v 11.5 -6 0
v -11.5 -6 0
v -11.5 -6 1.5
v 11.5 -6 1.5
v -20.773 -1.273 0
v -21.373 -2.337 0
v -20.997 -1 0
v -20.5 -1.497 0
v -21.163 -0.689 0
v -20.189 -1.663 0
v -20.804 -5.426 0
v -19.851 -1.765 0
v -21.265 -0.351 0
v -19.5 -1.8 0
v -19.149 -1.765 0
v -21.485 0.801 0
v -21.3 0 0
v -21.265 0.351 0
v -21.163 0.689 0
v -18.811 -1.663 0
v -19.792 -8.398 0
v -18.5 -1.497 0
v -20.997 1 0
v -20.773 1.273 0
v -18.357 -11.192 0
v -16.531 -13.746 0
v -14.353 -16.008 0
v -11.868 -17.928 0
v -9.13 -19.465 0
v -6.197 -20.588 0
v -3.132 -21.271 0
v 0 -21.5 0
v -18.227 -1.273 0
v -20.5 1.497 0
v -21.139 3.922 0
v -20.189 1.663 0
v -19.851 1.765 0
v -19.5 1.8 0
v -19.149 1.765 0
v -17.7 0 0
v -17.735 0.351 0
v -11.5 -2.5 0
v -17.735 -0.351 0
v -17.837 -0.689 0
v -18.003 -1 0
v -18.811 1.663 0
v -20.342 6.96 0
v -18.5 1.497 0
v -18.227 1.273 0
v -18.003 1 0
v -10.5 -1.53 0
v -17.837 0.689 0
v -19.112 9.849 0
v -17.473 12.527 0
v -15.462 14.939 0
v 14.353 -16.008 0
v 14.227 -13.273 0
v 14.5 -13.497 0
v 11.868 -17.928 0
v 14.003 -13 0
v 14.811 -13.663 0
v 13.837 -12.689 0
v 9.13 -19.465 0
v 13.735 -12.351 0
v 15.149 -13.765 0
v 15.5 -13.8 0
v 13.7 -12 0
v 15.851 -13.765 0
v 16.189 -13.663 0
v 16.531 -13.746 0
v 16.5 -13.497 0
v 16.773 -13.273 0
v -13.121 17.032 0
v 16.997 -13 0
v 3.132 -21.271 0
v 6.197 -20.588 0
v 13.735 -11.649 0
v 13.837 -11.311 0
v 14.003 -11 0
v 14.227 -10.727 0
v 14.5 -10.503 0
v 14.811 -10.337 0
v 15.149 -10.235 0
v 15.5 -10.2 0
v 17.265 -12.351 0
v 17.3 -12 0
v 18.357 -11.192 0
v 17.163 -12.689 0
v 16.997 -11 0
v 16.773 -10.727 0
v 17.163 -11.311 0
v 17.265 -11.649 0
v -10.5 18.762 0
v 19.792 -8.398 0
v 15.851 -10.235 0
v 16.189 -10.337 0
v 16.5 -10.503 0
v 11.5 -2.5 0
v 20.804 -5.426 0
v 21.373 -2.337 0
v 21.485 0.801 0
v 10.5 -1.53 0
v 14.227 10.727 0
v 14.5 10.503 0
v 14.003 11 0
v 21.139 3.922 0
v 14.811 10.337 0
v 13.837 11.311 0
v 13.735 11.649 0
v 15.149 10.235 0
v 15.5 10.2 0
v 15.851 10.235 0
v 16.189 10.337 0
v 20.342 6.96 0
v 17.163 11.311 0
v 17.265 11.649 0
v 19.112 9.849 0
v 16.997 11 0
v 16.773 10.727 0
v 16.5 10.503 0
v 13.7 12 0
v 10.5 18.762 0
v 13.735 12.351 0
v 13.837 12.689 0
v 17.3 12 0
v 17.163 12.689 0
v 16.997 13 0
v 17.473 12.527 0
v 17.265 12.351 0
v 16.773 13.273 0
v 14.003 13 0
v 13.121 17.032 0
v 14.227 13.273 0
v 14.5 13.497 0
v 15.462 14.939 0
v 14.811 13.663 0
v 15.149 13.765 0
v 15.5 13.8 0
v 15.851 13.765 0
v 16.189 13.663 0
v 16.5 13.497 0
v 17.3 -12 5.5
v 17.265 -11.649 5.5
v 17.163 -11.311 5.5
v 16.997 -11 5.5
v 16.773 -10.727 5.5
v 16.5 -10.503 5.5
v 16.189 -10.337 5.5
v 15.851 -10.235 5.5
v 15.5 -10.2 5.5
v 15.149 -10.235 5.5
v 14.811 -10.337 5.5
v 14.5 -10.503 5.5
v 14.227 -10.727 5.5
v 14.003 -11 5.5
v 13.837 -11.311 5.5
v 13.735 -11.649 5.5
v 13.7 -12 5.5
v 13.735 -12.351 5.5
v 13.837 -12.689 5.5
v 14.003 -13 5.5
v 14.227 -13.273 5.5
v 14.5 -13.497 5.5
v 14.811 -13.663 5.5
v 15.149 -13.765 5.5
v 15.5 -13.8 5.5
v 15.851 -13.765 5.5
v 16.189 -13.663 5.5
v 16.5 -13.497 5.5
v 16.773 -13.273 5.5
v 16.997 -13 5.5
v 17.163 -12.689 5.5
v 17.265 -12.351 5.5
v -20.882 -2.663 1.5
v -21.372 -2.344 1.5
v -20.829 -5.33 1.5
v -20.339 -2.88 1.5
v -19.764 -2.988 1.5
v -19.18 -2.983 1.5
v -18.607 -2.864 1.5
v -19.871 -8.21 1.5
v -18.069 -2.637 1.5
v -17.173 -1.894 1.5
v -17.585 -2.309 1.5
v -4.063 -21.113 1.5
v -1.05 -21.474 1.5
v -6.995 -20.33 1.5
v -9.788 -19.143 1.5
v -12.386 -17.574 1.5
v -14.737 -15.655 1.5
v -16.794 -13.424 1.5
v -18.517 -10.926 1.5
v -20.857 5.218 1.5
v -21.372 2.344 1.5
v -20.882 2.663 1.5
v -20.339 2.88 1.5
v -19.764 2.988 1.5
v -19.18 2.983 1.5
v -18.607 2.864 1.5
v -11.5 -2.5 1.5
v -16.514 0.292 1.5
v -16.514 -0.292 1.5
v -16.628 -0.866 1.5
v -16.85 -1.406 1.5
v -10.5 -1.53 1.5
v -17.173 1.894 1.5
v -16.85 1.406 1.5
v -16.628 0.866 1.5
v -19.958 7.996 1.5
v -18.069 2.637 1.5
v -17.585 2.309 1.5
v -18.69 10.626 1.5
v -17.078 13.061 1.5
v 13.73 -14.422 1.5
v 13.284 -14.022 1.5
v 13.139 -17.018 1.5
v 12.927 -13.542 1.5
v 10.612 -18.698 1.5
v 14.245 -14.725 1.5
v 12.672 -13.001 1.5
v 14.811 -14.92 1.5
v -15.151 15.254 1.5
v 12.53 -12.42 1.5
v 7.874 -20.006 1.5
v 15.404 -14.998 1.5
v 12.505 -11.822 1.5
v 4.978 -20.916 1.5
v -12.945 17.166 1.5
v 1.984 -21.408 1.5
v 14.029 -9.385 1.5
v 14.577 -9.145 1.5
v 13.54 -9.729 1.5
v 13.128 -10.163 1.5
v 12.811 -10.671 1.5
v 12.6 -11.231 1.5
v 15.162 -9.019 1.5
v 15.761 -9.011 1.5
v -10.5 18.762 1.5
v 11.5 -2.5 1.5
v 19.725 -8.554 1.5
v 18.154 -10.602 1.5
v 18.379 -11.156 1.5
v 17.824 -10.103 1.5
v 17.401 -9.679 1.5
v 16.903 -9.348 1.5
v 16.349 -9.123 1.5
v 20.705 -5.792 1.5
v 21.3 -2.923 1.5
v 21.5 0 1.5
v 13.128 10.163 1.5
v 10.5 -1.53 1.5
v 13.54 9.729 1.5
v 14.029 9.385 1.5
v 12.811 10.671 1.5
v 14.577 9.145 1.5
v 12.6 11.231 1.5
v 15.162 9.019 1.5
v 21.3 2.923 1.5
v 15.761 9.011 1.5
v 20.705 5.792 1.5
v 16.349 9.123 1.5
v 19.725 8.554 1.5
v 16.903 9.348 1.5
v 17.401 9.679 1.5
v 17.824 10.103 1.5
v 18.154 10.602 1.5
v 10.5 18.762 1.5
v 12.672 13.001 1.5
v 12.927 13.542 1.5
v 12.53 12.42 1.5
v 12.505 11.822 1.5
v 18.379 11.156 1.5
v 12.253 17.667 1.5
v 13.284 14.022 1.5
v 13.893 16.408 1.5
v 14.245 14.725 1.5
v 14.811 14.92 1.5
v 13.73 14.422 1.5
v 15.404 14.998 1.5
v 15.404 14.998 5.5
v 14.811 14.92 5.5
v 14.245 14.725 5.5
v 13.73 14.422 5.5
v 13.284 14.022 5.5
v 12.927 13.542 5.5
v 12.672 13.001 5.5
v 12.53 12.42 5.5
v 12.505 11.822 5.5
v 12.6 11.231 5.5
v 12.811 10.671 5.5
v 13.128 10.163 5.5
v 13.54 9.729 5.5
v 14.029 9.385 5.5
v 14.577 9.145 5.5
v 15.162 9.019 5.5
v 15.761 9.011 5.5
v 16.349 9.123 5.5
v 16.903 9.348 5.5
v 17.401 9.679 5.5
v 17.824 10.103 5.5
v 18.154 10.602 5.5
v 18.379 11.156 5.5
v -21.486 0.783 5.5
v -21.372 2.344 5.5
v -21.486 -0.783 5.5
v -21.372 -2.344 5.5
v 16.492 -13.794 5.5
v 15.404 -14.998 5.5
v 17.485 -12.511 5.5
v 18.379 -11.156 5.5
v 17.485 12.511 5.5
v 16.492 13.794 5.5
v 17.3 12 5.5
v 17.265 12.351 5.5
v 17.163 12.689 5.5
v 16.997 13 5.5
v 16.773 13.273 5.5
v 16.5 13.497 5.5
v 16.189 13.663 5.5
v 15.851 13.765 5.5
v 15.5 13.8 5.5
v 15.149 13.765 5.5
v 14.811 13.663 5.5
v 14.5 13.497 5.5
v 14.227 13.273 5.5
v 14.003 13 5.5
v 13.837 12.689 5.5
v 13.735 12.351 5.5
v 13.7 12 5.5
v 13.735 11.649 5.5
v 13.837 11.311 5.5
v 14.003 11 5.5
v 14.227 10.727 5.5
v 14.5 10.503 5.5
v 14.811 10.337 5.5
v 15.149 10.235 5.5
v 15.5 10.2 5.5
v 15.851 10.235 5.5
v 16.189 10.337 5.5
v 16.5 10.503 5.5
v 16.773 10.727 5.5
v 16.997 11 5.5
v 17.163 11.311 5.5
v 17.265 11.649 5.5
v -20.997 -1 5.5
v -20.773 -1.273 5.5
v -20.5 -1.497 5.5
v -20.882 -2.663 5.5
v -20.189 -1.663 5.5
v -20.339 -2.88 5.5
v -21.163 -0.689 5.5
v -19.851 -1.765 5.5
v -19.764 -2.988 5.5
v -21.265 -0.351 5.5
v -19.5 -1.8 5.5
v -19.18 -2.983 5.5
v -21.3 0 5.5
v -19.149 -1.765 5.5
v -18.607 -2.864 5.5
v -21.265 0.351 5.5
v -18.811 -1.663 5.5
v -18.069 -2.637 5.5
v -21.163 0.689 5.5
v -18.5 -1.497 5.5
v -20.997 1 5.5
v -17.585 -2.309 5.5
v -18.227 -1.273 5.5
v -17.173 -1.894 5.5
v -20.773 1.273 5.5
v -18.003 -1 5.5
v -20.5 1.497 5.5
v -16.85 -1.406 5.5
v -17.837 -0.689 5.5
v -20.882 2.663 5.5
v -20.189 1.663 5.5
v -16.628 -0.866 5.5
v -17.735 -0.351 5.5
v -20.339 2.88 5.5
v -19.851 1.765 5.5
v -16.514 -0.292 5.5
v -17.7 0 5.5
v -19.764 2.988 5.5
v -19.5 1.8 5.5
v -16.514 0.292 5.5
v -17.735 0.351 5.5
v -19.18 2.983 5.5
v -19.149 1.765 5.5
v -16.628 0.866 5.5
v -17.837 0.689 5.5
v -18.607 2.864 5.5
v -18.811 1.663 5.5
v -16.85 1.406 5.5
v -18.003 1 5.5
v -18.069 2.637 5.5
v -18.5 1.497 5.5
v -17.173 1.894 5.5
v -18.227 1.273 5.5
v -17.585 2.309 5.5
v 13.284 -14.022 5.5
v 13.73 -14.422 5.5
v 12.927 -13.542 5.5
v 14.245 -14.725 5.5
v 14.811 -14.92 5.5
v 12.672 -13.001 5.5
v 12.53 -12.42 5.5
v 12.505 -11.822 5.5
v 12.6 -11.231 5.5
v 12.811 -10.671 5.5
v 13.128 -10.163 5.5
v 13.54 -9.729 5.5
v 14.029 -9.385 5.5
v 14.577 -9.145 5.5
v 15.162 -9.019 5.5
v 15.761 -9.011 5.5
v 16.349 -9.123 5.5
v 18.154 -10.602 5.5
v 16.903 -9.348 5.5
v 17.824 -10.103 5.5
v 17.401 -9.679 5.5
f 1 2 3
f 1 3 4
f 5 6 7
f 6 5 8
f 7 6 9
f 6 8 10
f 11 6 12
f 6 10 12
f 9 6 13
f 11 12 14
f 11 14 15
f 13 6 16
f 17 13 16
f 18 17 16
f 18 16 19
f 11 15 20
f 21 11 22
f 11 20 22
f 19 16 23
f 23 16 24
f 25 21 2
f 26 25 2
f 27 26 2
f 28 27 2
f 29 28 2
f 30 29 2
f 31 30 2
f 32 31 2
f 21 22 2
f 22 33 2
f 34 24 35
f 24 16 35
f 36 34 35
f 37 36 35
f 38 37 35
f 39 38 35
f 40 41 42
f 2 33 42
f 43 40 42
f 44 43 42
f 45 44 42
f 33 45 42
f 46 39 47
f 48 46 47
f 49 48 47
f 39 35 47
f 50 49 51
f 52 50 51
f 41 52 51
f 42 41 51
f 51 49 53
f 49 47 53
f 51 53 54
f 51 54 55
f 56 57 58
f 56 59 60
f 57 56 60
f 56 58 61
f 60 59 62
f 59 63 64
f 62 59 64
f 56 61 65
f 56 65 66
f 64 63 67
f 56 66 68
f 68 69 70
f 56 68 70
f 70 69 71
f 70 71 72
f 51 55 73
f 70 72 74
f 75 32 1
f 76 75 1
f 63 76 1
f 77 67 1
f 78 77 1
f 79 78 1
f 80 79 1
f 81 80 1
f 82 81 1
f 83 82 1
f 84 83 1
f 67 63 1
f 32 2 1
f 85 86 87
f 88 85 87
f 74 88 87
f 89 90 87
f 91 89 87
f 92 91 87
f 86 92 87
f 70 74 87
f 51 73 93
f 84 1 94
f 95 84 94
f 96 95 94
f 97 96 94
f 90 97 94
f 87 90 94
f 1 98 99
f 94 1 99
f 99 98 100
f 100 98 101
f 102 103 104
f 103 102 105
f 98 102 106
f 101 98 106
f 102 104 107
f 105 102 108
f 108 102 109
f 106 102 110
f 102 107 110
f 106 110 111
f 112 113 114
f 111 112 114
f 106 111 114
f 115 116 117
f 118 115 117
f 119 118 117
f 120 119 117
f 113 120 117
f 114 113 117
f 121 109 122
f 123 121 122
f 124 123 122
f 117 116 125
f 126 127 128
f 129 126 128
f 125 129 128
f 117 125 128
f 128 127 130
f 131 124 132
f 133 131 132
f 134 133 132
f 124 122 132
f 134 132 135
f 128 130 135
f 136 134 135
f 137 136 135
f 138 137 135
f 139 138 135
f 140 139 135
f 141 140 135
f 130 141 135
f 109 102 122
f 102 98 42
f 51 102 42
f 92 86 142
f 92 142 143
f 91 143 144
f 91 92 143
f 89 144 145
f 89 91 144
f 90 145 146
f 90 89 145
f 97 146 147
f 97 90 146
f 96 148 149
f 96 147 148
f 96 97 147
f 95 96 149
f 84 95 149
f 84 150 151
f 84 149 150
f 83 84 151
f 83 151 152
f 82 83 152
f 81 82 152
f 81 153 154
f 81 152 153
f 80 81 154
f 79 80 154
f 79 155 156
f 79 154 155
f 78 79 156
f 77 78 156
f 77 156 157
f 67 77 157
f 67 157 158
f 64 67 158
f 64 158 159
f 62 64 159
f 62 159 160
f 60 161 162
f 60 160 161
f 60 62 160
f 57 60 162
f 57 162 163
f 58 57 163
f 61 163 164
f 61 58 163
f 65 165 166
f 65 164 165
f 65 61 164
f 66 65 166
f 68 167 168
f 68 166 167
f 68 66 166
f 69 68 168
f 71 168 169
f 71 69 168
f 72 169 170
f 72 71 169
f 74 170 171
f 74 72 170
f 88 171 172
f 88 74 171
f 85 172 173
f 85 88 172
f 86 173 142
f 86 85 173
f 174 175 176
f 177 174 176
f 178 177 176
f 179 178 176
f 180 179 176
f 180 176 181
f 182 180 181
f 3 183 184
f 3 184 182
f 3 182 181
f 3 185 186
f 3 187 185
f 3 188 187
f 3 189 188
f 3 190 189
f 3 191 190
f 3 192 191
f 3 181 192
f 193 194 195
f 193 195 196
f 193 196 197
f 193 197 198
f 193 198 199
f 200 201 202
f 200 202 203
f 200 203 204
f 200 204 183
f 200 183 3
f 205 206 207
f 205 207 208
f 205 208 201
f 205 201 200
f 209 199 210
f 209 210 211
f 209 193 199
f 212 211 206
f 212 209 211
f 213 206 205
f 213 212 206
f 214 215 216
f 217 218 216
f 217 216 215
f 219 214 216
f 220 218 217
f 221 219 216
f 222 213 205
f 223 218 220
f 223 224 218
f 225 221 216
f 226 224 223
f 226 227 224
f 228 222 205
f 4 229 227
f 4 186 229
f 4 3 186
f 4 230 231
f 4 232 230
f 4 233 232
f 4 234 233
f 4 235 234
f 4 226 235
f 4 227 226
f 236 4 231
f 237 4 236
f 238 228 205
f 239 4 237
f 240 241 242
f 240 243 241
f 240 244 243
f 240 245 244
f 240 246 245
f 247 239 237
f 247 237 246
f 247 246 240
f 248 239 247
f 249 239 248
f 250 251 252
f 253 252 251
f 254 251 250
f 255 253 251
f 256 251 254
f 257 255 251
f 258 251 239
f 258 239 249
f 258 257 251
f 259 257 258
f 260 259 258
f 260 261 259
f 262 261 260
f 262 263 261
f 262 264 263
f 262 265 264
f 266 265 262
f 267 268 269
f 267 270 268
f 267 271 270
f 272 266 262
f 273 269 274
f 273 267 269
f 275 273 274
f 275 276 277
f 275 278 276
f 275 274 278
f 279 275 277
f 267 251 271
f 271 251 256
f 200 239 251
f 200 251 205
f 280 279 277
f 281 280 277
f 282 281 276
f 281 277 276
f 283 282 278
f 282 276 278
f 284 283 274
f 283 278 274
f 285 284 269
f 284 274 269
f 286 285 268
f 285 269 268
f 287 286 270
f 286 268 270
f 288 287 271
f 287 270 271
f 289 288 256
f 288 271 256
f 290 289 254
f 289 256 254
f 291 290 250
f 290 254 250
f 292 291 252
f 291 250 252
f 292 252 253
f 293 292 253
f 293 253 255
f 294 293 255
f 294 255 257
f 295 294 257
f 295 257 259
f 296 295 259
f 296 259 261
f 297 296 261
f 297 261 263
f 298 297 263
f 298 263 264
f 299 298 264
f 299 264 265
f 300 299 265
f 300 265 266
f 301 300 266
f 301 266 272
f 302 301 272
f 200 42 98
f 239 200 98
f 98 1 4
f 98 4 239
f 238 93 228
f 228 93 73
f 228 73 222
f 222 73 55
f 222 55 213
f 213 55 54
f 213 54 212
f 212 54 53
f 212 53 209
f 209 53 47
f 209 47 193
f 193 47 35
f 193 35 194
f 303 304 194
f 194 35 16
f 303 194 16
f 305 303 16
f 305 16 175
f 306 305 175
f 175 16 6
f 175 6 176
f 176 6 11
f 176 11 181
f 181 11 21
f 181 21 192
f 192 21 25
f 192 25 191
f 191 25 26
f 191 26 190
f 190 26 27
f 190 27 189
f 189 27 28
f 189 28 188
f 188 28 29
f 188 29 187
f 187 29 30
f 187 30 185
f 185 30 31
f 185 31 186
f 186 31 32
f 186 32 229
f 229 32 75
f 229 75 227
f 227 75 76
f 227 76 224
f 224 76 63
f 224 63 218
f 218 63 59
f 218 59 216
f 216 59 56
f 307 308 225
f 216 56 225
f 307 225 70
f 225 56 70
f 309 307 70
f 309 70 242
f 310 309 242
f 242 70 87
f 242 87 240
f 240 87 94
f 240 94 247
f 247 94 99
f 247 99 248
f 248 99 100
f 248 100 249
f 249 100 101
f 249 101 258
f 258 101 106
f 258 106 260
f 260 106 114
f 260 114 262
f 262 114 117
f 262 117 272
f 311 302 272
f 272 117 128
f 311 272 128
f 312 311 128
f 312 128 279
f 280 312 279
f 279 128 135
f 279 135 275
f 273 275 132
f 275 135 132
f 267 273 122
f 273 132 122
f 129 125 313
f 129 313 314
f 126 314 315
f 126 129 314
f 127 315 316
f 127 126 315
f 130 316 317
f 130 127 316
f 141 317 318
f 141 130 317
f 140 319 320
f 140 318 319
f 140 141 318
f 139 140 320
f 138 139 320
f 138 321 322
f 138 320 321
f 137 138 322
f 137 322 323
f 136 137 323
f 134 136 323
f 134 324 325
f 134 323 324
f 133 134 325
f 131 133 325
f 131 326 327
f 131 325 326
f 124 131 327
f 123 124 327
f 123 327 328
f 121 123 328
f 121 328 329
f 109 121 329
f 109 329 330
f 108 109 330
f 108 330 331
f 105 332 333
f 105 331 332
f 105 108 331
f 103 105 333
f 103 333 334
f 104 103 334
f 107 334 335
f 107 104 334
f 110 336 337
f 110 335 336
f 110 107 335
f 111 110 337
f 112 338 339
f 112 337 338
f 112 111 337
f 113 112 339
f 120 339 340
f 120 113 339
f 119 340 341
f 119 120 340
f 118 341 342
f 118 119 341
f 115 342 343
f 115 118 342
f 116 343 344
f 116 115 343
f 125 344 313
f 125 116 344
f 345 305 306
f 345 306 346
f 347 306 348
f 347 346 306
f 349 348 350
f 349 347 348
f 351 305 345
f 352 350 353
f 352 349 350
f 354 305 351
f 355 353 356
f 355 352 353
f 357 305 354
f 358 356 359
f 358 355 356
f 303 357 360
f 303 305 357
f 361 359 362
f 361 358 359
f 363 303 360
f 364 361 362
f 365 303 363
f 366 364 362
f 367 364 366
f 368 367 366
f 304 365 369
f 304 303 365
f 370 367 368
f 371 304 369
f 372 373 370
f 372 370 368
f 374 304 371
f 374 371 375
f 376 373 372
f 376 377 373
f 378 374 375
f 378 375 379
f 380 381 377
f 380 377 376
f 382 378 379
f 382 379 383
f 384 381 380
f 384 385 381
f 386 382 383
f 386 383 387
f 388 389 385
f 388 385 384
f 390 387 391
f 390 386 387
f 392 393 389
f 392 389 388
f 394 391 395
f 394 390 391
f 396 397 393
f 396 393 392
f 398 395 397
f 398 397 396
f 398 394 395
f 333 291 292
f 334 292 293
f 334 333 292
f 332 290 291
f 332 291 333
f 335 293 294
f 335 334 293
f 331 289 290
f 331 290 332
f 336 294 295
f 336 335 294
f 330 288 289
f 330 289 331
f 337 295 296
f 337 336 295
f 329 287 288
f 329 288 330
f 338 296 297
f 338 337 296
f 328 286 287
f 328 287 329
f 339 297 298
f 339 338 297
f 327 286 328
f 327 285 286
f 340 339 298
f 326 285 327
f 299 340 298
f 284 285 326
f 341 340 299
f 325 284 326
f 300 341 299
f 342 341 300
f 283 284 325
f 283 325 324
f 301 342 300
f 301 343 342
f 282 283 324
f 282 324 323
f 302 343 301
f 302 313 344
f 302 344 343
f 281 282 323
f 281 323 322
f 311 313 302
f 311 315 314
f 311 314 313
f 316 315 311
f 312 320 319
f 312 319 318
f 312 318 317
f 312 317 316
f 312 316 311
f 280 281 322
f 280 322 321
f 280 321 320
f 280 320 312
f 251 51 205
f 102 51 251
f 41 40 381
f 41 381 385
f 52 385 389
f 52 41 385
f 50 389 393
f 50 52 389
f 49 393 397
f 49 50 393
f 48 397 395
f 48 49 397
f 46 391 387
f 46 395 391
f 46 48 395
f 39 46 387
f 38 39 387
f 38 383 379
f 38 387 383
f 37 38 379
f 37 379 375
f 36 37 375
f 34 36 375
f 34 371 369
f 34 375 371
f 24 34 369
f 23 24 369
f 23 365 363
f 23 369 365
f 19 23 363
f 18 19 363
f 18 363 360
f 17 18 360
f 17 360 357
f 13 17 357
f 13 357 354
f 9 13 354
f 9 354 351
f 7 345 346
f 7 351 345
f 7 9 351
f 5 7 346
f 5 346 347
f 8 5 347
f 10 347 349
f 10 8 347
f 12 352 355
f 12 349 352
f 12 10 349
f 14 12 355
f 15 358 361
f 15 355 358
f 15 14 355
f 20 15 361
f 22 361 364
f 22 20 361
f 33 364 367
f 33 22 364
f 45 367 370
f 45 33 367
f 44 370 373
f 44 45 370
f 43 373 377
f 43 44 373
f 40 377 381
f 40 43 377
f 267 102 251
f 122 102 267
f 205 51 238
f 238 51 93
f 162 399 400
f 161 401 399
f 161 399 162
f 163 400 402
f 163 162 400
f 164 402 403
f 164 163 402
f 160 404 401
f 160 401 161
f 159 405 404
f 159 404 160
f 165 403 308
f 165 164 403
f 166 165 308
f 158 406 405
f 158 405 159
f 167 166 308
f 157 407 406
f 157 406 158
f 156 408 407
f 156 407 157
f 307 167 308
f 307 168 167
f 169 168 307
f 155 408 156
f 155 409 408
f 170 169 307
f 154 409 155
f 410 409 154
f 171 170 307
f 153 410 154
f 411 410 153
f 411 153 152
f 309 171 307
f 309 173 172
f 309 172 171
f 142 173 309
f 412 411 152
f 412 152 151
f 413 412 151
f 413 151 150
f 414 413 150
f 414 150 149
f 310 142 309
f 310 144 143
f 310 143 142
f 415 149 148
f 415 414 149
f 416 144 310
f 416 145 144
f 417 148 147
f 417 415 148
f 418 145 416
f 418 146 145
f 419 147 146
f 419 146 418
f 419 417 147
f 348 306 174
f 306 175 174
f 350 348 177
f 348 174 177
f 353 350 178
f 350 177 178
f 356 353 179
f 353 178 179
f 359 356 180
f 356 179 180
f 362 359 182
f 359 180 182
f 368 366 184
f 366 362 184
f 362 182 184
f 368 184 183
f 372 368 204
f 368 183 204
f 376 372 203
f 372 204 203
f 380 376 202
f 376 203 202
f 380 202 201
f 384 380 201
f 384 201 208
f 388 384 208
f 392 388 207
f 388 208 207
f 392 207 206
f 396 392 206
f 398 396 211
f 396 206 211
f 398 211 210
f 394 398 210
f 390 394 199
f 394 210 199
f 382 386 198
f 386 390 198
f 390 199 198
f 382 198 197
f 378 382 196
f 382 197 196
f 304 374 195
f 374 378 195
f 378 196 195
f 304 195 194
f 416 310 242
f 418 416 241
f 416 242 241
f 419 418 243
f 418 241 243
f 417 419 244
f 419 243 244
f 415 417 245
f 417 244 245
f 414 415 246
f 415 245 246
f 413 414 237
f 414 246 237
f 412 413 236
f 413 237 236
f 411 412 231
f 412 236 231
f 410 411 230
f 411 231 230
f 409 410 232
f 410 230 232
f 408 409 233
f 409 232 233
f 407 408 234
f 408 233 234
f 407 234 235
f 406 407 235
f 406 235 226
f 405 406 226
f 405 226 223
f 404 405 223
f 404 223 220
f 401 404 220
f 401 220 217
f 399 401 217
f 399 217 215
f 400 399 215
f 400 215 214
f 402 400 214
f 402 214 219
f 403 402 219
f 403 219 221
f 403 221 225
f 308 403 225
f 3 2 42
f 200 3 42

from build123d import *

# Parameters (mm, degrees)
CYLINDER007_R     = 21.5
CYLINDER007_DEPTH = 10
BOX002_W          = 50
BOX002_H          = 50
BOX002_DEPTH      = 10
CYLINDER006_R     = 1.8
CYLINDER006_DEPTH = 10
CYLINDER005_R     = 3
CYLINDER005_DEPTH = 4
CYLINDER004_R     = 1.8
CYLINDER004_DEPTH = 10
CYLINDER003_R     = 3
CYLINDER003_DEPTH = 4
CYLINDER002_R     = 1.8
CYLINDER002_DEPTH = 10
CYLINDER001_R     = 3
CYLINDER001_DEPTH = 4
BOX001_W          = 23
BOX001_H          = 3.5
BOX001_DEPTH      = 2
BOX_W             = 21
BOX_H             = 25
BOX_DEPTH         = 5
CYLINDER_R        = 21.5
CYLINDER_DEPTH    = 1.5


with BuildPart() as cylinder007:
    # Cylinder007 → Cylinder007 (new body)
    with BuildSketch(Plane.XY):
        Circle(CYLINDER007_R)
    extrude(amount=CYLINDER007_DEPTH)


with BuildPart() as cut005:
    # Box002 → Box002 (new body)
    with BuildSketch(Plane(origin=(-25, -25, 0), x_dir=(1, 0, 0), z_dir=(0, 0, 1))):
        with Locations((25, 25)):
            Rectangle(BOX002_W, BOX002_H)
    extrude(amount=BOX002_DEPTH)

    # Cut005: cut Cylinder007
    add(cylinder007.part, mode=Mode.SUBTRACT)


with BuildPart() as cylinder006:
    # Cylinder006 → Cylinder006 (new body)
    with BuildSketch(Plane(origin=(15.5, 12, -2), x_dir=(1, 0, 0), z_dir=(0, 0, 1))):
        Circle(CYLINDER006_R)
    extrude(amount=CYLINDER006_DEPTH)


with BuildPart() as cylinder005:
    # Cylinder005 → Cylinder005 (new body)
    with BuildSketch(Plane(origin=(15.5, 12, 1.5), x_dir=(1, 0, 0), z_dir=(0, 0, 1))):
        Circle(CYLINDER005_R)
    extrude(amount=CYLINDER005_DEPTH)


with BuildPart() as cylinder004:
    # Cylinder004 → Cylinder004 (new body)
    with BuildSketch(Plane(origin=(15.5, -12, -2), x_dir=(1, 0, 0), z_dir=(0, 0, 1))):
        Circle(CYLINDER004_R)
    extrude(amount=CYLINDER004_DEPTH)


with BuildPart() as cylinder003:
    # Cylinder003 → Cylinder003 (new body)
    with BuildSketch(Plane(origin=(15.5, -12, 1.5), x_dir=(1, 0, 0), z_dir=(0, 0, 1))):
        Circle(CYLINDER003_R)
    extrude(amount=CYLINDER003_DEPTH)


with BuildPart() as cylinder002:
    # Cylinder002 → Cylinder002 (new body)
    with BuildSketch(Plane(origin=(-19.5, 0, -2), x_dir=(1, 0, 0), z_dir=(0, 0, 1))):
        Circle(CYLINDER002_R)
    extrude(amount=CYLINDER002_DEPTH)


with BuildPart() as cylinder001:
    # Cylinder001 → Cylinder001 (new body)
    with BuildSketch(Plane(origin=(-19.5, 0, 1.5), x_dir=(1, 0, 0), z_dir=(0, 0, 1))):
        Circle(CYLINDER001_R)
    extrude(amount=CYLINDER001_DEPTH)


with BuildPart() as box001:
    # Box001 → Box001 (new body)
    with BuildSketch(Plane(origin=(-11.5, -6, 0), x_dir=(1, 0, 0), z_dir=(0, 0, 1))):
        with Locations((11.5, 1.75)):
            Rectangle(BOX001_W, BOX001_H)
    extrude(amount=BOX001_DEPTH)


with BuildPart() as box:
    # Box → Box (new body)
    with BuildSketch(Plane(origin=(-10.5, -1.53, -2), x_dir=(1, 0, 0), z_dir=(0, 0, 1))):
        with Locations((10.5, 12.5)):
            Rectangle(BOX_W, BOX_H)
    extrude(amount=BOX_DEPTH)


with BuildPart() as cut006:
    # Cylinder → Cylinder (new body)
    with BuildSketch(Plane.XY):
        Circle(CYLINDER_R)
    extrude(amount=CYLINDER_DEPTH)

    # Cut: cut Box
    add(box.part, mode=Mode.SUBTRACT)

    # Cut001: cut Box001
    add(box001.part, mode=Mode.SUBTRACT)

    # Fusion: union Cylinder001
    add(cylinder001.part)

    # Cut002: cut Cylinder002
    add(cylinder002.part, mode=Mode.SUBTRACT)

    # Fusion001: union Cylinder003
    add(cylinder003.part)

    # Cut003: cut Cylinder004
    add(cylinder004.part, mode=Mode.SUBTRACT)

    # Fusion002: union Cylinder005
    add(cylinder005.part)

    # Cut004: cut Cylinder006
    add(cylinder006.part, mode=Mode.SUBTRACT)

    # Cut006: cut Cut005
    add(cut005.part, mode=Mode.SUBTRACT)


solid = cut006.part
